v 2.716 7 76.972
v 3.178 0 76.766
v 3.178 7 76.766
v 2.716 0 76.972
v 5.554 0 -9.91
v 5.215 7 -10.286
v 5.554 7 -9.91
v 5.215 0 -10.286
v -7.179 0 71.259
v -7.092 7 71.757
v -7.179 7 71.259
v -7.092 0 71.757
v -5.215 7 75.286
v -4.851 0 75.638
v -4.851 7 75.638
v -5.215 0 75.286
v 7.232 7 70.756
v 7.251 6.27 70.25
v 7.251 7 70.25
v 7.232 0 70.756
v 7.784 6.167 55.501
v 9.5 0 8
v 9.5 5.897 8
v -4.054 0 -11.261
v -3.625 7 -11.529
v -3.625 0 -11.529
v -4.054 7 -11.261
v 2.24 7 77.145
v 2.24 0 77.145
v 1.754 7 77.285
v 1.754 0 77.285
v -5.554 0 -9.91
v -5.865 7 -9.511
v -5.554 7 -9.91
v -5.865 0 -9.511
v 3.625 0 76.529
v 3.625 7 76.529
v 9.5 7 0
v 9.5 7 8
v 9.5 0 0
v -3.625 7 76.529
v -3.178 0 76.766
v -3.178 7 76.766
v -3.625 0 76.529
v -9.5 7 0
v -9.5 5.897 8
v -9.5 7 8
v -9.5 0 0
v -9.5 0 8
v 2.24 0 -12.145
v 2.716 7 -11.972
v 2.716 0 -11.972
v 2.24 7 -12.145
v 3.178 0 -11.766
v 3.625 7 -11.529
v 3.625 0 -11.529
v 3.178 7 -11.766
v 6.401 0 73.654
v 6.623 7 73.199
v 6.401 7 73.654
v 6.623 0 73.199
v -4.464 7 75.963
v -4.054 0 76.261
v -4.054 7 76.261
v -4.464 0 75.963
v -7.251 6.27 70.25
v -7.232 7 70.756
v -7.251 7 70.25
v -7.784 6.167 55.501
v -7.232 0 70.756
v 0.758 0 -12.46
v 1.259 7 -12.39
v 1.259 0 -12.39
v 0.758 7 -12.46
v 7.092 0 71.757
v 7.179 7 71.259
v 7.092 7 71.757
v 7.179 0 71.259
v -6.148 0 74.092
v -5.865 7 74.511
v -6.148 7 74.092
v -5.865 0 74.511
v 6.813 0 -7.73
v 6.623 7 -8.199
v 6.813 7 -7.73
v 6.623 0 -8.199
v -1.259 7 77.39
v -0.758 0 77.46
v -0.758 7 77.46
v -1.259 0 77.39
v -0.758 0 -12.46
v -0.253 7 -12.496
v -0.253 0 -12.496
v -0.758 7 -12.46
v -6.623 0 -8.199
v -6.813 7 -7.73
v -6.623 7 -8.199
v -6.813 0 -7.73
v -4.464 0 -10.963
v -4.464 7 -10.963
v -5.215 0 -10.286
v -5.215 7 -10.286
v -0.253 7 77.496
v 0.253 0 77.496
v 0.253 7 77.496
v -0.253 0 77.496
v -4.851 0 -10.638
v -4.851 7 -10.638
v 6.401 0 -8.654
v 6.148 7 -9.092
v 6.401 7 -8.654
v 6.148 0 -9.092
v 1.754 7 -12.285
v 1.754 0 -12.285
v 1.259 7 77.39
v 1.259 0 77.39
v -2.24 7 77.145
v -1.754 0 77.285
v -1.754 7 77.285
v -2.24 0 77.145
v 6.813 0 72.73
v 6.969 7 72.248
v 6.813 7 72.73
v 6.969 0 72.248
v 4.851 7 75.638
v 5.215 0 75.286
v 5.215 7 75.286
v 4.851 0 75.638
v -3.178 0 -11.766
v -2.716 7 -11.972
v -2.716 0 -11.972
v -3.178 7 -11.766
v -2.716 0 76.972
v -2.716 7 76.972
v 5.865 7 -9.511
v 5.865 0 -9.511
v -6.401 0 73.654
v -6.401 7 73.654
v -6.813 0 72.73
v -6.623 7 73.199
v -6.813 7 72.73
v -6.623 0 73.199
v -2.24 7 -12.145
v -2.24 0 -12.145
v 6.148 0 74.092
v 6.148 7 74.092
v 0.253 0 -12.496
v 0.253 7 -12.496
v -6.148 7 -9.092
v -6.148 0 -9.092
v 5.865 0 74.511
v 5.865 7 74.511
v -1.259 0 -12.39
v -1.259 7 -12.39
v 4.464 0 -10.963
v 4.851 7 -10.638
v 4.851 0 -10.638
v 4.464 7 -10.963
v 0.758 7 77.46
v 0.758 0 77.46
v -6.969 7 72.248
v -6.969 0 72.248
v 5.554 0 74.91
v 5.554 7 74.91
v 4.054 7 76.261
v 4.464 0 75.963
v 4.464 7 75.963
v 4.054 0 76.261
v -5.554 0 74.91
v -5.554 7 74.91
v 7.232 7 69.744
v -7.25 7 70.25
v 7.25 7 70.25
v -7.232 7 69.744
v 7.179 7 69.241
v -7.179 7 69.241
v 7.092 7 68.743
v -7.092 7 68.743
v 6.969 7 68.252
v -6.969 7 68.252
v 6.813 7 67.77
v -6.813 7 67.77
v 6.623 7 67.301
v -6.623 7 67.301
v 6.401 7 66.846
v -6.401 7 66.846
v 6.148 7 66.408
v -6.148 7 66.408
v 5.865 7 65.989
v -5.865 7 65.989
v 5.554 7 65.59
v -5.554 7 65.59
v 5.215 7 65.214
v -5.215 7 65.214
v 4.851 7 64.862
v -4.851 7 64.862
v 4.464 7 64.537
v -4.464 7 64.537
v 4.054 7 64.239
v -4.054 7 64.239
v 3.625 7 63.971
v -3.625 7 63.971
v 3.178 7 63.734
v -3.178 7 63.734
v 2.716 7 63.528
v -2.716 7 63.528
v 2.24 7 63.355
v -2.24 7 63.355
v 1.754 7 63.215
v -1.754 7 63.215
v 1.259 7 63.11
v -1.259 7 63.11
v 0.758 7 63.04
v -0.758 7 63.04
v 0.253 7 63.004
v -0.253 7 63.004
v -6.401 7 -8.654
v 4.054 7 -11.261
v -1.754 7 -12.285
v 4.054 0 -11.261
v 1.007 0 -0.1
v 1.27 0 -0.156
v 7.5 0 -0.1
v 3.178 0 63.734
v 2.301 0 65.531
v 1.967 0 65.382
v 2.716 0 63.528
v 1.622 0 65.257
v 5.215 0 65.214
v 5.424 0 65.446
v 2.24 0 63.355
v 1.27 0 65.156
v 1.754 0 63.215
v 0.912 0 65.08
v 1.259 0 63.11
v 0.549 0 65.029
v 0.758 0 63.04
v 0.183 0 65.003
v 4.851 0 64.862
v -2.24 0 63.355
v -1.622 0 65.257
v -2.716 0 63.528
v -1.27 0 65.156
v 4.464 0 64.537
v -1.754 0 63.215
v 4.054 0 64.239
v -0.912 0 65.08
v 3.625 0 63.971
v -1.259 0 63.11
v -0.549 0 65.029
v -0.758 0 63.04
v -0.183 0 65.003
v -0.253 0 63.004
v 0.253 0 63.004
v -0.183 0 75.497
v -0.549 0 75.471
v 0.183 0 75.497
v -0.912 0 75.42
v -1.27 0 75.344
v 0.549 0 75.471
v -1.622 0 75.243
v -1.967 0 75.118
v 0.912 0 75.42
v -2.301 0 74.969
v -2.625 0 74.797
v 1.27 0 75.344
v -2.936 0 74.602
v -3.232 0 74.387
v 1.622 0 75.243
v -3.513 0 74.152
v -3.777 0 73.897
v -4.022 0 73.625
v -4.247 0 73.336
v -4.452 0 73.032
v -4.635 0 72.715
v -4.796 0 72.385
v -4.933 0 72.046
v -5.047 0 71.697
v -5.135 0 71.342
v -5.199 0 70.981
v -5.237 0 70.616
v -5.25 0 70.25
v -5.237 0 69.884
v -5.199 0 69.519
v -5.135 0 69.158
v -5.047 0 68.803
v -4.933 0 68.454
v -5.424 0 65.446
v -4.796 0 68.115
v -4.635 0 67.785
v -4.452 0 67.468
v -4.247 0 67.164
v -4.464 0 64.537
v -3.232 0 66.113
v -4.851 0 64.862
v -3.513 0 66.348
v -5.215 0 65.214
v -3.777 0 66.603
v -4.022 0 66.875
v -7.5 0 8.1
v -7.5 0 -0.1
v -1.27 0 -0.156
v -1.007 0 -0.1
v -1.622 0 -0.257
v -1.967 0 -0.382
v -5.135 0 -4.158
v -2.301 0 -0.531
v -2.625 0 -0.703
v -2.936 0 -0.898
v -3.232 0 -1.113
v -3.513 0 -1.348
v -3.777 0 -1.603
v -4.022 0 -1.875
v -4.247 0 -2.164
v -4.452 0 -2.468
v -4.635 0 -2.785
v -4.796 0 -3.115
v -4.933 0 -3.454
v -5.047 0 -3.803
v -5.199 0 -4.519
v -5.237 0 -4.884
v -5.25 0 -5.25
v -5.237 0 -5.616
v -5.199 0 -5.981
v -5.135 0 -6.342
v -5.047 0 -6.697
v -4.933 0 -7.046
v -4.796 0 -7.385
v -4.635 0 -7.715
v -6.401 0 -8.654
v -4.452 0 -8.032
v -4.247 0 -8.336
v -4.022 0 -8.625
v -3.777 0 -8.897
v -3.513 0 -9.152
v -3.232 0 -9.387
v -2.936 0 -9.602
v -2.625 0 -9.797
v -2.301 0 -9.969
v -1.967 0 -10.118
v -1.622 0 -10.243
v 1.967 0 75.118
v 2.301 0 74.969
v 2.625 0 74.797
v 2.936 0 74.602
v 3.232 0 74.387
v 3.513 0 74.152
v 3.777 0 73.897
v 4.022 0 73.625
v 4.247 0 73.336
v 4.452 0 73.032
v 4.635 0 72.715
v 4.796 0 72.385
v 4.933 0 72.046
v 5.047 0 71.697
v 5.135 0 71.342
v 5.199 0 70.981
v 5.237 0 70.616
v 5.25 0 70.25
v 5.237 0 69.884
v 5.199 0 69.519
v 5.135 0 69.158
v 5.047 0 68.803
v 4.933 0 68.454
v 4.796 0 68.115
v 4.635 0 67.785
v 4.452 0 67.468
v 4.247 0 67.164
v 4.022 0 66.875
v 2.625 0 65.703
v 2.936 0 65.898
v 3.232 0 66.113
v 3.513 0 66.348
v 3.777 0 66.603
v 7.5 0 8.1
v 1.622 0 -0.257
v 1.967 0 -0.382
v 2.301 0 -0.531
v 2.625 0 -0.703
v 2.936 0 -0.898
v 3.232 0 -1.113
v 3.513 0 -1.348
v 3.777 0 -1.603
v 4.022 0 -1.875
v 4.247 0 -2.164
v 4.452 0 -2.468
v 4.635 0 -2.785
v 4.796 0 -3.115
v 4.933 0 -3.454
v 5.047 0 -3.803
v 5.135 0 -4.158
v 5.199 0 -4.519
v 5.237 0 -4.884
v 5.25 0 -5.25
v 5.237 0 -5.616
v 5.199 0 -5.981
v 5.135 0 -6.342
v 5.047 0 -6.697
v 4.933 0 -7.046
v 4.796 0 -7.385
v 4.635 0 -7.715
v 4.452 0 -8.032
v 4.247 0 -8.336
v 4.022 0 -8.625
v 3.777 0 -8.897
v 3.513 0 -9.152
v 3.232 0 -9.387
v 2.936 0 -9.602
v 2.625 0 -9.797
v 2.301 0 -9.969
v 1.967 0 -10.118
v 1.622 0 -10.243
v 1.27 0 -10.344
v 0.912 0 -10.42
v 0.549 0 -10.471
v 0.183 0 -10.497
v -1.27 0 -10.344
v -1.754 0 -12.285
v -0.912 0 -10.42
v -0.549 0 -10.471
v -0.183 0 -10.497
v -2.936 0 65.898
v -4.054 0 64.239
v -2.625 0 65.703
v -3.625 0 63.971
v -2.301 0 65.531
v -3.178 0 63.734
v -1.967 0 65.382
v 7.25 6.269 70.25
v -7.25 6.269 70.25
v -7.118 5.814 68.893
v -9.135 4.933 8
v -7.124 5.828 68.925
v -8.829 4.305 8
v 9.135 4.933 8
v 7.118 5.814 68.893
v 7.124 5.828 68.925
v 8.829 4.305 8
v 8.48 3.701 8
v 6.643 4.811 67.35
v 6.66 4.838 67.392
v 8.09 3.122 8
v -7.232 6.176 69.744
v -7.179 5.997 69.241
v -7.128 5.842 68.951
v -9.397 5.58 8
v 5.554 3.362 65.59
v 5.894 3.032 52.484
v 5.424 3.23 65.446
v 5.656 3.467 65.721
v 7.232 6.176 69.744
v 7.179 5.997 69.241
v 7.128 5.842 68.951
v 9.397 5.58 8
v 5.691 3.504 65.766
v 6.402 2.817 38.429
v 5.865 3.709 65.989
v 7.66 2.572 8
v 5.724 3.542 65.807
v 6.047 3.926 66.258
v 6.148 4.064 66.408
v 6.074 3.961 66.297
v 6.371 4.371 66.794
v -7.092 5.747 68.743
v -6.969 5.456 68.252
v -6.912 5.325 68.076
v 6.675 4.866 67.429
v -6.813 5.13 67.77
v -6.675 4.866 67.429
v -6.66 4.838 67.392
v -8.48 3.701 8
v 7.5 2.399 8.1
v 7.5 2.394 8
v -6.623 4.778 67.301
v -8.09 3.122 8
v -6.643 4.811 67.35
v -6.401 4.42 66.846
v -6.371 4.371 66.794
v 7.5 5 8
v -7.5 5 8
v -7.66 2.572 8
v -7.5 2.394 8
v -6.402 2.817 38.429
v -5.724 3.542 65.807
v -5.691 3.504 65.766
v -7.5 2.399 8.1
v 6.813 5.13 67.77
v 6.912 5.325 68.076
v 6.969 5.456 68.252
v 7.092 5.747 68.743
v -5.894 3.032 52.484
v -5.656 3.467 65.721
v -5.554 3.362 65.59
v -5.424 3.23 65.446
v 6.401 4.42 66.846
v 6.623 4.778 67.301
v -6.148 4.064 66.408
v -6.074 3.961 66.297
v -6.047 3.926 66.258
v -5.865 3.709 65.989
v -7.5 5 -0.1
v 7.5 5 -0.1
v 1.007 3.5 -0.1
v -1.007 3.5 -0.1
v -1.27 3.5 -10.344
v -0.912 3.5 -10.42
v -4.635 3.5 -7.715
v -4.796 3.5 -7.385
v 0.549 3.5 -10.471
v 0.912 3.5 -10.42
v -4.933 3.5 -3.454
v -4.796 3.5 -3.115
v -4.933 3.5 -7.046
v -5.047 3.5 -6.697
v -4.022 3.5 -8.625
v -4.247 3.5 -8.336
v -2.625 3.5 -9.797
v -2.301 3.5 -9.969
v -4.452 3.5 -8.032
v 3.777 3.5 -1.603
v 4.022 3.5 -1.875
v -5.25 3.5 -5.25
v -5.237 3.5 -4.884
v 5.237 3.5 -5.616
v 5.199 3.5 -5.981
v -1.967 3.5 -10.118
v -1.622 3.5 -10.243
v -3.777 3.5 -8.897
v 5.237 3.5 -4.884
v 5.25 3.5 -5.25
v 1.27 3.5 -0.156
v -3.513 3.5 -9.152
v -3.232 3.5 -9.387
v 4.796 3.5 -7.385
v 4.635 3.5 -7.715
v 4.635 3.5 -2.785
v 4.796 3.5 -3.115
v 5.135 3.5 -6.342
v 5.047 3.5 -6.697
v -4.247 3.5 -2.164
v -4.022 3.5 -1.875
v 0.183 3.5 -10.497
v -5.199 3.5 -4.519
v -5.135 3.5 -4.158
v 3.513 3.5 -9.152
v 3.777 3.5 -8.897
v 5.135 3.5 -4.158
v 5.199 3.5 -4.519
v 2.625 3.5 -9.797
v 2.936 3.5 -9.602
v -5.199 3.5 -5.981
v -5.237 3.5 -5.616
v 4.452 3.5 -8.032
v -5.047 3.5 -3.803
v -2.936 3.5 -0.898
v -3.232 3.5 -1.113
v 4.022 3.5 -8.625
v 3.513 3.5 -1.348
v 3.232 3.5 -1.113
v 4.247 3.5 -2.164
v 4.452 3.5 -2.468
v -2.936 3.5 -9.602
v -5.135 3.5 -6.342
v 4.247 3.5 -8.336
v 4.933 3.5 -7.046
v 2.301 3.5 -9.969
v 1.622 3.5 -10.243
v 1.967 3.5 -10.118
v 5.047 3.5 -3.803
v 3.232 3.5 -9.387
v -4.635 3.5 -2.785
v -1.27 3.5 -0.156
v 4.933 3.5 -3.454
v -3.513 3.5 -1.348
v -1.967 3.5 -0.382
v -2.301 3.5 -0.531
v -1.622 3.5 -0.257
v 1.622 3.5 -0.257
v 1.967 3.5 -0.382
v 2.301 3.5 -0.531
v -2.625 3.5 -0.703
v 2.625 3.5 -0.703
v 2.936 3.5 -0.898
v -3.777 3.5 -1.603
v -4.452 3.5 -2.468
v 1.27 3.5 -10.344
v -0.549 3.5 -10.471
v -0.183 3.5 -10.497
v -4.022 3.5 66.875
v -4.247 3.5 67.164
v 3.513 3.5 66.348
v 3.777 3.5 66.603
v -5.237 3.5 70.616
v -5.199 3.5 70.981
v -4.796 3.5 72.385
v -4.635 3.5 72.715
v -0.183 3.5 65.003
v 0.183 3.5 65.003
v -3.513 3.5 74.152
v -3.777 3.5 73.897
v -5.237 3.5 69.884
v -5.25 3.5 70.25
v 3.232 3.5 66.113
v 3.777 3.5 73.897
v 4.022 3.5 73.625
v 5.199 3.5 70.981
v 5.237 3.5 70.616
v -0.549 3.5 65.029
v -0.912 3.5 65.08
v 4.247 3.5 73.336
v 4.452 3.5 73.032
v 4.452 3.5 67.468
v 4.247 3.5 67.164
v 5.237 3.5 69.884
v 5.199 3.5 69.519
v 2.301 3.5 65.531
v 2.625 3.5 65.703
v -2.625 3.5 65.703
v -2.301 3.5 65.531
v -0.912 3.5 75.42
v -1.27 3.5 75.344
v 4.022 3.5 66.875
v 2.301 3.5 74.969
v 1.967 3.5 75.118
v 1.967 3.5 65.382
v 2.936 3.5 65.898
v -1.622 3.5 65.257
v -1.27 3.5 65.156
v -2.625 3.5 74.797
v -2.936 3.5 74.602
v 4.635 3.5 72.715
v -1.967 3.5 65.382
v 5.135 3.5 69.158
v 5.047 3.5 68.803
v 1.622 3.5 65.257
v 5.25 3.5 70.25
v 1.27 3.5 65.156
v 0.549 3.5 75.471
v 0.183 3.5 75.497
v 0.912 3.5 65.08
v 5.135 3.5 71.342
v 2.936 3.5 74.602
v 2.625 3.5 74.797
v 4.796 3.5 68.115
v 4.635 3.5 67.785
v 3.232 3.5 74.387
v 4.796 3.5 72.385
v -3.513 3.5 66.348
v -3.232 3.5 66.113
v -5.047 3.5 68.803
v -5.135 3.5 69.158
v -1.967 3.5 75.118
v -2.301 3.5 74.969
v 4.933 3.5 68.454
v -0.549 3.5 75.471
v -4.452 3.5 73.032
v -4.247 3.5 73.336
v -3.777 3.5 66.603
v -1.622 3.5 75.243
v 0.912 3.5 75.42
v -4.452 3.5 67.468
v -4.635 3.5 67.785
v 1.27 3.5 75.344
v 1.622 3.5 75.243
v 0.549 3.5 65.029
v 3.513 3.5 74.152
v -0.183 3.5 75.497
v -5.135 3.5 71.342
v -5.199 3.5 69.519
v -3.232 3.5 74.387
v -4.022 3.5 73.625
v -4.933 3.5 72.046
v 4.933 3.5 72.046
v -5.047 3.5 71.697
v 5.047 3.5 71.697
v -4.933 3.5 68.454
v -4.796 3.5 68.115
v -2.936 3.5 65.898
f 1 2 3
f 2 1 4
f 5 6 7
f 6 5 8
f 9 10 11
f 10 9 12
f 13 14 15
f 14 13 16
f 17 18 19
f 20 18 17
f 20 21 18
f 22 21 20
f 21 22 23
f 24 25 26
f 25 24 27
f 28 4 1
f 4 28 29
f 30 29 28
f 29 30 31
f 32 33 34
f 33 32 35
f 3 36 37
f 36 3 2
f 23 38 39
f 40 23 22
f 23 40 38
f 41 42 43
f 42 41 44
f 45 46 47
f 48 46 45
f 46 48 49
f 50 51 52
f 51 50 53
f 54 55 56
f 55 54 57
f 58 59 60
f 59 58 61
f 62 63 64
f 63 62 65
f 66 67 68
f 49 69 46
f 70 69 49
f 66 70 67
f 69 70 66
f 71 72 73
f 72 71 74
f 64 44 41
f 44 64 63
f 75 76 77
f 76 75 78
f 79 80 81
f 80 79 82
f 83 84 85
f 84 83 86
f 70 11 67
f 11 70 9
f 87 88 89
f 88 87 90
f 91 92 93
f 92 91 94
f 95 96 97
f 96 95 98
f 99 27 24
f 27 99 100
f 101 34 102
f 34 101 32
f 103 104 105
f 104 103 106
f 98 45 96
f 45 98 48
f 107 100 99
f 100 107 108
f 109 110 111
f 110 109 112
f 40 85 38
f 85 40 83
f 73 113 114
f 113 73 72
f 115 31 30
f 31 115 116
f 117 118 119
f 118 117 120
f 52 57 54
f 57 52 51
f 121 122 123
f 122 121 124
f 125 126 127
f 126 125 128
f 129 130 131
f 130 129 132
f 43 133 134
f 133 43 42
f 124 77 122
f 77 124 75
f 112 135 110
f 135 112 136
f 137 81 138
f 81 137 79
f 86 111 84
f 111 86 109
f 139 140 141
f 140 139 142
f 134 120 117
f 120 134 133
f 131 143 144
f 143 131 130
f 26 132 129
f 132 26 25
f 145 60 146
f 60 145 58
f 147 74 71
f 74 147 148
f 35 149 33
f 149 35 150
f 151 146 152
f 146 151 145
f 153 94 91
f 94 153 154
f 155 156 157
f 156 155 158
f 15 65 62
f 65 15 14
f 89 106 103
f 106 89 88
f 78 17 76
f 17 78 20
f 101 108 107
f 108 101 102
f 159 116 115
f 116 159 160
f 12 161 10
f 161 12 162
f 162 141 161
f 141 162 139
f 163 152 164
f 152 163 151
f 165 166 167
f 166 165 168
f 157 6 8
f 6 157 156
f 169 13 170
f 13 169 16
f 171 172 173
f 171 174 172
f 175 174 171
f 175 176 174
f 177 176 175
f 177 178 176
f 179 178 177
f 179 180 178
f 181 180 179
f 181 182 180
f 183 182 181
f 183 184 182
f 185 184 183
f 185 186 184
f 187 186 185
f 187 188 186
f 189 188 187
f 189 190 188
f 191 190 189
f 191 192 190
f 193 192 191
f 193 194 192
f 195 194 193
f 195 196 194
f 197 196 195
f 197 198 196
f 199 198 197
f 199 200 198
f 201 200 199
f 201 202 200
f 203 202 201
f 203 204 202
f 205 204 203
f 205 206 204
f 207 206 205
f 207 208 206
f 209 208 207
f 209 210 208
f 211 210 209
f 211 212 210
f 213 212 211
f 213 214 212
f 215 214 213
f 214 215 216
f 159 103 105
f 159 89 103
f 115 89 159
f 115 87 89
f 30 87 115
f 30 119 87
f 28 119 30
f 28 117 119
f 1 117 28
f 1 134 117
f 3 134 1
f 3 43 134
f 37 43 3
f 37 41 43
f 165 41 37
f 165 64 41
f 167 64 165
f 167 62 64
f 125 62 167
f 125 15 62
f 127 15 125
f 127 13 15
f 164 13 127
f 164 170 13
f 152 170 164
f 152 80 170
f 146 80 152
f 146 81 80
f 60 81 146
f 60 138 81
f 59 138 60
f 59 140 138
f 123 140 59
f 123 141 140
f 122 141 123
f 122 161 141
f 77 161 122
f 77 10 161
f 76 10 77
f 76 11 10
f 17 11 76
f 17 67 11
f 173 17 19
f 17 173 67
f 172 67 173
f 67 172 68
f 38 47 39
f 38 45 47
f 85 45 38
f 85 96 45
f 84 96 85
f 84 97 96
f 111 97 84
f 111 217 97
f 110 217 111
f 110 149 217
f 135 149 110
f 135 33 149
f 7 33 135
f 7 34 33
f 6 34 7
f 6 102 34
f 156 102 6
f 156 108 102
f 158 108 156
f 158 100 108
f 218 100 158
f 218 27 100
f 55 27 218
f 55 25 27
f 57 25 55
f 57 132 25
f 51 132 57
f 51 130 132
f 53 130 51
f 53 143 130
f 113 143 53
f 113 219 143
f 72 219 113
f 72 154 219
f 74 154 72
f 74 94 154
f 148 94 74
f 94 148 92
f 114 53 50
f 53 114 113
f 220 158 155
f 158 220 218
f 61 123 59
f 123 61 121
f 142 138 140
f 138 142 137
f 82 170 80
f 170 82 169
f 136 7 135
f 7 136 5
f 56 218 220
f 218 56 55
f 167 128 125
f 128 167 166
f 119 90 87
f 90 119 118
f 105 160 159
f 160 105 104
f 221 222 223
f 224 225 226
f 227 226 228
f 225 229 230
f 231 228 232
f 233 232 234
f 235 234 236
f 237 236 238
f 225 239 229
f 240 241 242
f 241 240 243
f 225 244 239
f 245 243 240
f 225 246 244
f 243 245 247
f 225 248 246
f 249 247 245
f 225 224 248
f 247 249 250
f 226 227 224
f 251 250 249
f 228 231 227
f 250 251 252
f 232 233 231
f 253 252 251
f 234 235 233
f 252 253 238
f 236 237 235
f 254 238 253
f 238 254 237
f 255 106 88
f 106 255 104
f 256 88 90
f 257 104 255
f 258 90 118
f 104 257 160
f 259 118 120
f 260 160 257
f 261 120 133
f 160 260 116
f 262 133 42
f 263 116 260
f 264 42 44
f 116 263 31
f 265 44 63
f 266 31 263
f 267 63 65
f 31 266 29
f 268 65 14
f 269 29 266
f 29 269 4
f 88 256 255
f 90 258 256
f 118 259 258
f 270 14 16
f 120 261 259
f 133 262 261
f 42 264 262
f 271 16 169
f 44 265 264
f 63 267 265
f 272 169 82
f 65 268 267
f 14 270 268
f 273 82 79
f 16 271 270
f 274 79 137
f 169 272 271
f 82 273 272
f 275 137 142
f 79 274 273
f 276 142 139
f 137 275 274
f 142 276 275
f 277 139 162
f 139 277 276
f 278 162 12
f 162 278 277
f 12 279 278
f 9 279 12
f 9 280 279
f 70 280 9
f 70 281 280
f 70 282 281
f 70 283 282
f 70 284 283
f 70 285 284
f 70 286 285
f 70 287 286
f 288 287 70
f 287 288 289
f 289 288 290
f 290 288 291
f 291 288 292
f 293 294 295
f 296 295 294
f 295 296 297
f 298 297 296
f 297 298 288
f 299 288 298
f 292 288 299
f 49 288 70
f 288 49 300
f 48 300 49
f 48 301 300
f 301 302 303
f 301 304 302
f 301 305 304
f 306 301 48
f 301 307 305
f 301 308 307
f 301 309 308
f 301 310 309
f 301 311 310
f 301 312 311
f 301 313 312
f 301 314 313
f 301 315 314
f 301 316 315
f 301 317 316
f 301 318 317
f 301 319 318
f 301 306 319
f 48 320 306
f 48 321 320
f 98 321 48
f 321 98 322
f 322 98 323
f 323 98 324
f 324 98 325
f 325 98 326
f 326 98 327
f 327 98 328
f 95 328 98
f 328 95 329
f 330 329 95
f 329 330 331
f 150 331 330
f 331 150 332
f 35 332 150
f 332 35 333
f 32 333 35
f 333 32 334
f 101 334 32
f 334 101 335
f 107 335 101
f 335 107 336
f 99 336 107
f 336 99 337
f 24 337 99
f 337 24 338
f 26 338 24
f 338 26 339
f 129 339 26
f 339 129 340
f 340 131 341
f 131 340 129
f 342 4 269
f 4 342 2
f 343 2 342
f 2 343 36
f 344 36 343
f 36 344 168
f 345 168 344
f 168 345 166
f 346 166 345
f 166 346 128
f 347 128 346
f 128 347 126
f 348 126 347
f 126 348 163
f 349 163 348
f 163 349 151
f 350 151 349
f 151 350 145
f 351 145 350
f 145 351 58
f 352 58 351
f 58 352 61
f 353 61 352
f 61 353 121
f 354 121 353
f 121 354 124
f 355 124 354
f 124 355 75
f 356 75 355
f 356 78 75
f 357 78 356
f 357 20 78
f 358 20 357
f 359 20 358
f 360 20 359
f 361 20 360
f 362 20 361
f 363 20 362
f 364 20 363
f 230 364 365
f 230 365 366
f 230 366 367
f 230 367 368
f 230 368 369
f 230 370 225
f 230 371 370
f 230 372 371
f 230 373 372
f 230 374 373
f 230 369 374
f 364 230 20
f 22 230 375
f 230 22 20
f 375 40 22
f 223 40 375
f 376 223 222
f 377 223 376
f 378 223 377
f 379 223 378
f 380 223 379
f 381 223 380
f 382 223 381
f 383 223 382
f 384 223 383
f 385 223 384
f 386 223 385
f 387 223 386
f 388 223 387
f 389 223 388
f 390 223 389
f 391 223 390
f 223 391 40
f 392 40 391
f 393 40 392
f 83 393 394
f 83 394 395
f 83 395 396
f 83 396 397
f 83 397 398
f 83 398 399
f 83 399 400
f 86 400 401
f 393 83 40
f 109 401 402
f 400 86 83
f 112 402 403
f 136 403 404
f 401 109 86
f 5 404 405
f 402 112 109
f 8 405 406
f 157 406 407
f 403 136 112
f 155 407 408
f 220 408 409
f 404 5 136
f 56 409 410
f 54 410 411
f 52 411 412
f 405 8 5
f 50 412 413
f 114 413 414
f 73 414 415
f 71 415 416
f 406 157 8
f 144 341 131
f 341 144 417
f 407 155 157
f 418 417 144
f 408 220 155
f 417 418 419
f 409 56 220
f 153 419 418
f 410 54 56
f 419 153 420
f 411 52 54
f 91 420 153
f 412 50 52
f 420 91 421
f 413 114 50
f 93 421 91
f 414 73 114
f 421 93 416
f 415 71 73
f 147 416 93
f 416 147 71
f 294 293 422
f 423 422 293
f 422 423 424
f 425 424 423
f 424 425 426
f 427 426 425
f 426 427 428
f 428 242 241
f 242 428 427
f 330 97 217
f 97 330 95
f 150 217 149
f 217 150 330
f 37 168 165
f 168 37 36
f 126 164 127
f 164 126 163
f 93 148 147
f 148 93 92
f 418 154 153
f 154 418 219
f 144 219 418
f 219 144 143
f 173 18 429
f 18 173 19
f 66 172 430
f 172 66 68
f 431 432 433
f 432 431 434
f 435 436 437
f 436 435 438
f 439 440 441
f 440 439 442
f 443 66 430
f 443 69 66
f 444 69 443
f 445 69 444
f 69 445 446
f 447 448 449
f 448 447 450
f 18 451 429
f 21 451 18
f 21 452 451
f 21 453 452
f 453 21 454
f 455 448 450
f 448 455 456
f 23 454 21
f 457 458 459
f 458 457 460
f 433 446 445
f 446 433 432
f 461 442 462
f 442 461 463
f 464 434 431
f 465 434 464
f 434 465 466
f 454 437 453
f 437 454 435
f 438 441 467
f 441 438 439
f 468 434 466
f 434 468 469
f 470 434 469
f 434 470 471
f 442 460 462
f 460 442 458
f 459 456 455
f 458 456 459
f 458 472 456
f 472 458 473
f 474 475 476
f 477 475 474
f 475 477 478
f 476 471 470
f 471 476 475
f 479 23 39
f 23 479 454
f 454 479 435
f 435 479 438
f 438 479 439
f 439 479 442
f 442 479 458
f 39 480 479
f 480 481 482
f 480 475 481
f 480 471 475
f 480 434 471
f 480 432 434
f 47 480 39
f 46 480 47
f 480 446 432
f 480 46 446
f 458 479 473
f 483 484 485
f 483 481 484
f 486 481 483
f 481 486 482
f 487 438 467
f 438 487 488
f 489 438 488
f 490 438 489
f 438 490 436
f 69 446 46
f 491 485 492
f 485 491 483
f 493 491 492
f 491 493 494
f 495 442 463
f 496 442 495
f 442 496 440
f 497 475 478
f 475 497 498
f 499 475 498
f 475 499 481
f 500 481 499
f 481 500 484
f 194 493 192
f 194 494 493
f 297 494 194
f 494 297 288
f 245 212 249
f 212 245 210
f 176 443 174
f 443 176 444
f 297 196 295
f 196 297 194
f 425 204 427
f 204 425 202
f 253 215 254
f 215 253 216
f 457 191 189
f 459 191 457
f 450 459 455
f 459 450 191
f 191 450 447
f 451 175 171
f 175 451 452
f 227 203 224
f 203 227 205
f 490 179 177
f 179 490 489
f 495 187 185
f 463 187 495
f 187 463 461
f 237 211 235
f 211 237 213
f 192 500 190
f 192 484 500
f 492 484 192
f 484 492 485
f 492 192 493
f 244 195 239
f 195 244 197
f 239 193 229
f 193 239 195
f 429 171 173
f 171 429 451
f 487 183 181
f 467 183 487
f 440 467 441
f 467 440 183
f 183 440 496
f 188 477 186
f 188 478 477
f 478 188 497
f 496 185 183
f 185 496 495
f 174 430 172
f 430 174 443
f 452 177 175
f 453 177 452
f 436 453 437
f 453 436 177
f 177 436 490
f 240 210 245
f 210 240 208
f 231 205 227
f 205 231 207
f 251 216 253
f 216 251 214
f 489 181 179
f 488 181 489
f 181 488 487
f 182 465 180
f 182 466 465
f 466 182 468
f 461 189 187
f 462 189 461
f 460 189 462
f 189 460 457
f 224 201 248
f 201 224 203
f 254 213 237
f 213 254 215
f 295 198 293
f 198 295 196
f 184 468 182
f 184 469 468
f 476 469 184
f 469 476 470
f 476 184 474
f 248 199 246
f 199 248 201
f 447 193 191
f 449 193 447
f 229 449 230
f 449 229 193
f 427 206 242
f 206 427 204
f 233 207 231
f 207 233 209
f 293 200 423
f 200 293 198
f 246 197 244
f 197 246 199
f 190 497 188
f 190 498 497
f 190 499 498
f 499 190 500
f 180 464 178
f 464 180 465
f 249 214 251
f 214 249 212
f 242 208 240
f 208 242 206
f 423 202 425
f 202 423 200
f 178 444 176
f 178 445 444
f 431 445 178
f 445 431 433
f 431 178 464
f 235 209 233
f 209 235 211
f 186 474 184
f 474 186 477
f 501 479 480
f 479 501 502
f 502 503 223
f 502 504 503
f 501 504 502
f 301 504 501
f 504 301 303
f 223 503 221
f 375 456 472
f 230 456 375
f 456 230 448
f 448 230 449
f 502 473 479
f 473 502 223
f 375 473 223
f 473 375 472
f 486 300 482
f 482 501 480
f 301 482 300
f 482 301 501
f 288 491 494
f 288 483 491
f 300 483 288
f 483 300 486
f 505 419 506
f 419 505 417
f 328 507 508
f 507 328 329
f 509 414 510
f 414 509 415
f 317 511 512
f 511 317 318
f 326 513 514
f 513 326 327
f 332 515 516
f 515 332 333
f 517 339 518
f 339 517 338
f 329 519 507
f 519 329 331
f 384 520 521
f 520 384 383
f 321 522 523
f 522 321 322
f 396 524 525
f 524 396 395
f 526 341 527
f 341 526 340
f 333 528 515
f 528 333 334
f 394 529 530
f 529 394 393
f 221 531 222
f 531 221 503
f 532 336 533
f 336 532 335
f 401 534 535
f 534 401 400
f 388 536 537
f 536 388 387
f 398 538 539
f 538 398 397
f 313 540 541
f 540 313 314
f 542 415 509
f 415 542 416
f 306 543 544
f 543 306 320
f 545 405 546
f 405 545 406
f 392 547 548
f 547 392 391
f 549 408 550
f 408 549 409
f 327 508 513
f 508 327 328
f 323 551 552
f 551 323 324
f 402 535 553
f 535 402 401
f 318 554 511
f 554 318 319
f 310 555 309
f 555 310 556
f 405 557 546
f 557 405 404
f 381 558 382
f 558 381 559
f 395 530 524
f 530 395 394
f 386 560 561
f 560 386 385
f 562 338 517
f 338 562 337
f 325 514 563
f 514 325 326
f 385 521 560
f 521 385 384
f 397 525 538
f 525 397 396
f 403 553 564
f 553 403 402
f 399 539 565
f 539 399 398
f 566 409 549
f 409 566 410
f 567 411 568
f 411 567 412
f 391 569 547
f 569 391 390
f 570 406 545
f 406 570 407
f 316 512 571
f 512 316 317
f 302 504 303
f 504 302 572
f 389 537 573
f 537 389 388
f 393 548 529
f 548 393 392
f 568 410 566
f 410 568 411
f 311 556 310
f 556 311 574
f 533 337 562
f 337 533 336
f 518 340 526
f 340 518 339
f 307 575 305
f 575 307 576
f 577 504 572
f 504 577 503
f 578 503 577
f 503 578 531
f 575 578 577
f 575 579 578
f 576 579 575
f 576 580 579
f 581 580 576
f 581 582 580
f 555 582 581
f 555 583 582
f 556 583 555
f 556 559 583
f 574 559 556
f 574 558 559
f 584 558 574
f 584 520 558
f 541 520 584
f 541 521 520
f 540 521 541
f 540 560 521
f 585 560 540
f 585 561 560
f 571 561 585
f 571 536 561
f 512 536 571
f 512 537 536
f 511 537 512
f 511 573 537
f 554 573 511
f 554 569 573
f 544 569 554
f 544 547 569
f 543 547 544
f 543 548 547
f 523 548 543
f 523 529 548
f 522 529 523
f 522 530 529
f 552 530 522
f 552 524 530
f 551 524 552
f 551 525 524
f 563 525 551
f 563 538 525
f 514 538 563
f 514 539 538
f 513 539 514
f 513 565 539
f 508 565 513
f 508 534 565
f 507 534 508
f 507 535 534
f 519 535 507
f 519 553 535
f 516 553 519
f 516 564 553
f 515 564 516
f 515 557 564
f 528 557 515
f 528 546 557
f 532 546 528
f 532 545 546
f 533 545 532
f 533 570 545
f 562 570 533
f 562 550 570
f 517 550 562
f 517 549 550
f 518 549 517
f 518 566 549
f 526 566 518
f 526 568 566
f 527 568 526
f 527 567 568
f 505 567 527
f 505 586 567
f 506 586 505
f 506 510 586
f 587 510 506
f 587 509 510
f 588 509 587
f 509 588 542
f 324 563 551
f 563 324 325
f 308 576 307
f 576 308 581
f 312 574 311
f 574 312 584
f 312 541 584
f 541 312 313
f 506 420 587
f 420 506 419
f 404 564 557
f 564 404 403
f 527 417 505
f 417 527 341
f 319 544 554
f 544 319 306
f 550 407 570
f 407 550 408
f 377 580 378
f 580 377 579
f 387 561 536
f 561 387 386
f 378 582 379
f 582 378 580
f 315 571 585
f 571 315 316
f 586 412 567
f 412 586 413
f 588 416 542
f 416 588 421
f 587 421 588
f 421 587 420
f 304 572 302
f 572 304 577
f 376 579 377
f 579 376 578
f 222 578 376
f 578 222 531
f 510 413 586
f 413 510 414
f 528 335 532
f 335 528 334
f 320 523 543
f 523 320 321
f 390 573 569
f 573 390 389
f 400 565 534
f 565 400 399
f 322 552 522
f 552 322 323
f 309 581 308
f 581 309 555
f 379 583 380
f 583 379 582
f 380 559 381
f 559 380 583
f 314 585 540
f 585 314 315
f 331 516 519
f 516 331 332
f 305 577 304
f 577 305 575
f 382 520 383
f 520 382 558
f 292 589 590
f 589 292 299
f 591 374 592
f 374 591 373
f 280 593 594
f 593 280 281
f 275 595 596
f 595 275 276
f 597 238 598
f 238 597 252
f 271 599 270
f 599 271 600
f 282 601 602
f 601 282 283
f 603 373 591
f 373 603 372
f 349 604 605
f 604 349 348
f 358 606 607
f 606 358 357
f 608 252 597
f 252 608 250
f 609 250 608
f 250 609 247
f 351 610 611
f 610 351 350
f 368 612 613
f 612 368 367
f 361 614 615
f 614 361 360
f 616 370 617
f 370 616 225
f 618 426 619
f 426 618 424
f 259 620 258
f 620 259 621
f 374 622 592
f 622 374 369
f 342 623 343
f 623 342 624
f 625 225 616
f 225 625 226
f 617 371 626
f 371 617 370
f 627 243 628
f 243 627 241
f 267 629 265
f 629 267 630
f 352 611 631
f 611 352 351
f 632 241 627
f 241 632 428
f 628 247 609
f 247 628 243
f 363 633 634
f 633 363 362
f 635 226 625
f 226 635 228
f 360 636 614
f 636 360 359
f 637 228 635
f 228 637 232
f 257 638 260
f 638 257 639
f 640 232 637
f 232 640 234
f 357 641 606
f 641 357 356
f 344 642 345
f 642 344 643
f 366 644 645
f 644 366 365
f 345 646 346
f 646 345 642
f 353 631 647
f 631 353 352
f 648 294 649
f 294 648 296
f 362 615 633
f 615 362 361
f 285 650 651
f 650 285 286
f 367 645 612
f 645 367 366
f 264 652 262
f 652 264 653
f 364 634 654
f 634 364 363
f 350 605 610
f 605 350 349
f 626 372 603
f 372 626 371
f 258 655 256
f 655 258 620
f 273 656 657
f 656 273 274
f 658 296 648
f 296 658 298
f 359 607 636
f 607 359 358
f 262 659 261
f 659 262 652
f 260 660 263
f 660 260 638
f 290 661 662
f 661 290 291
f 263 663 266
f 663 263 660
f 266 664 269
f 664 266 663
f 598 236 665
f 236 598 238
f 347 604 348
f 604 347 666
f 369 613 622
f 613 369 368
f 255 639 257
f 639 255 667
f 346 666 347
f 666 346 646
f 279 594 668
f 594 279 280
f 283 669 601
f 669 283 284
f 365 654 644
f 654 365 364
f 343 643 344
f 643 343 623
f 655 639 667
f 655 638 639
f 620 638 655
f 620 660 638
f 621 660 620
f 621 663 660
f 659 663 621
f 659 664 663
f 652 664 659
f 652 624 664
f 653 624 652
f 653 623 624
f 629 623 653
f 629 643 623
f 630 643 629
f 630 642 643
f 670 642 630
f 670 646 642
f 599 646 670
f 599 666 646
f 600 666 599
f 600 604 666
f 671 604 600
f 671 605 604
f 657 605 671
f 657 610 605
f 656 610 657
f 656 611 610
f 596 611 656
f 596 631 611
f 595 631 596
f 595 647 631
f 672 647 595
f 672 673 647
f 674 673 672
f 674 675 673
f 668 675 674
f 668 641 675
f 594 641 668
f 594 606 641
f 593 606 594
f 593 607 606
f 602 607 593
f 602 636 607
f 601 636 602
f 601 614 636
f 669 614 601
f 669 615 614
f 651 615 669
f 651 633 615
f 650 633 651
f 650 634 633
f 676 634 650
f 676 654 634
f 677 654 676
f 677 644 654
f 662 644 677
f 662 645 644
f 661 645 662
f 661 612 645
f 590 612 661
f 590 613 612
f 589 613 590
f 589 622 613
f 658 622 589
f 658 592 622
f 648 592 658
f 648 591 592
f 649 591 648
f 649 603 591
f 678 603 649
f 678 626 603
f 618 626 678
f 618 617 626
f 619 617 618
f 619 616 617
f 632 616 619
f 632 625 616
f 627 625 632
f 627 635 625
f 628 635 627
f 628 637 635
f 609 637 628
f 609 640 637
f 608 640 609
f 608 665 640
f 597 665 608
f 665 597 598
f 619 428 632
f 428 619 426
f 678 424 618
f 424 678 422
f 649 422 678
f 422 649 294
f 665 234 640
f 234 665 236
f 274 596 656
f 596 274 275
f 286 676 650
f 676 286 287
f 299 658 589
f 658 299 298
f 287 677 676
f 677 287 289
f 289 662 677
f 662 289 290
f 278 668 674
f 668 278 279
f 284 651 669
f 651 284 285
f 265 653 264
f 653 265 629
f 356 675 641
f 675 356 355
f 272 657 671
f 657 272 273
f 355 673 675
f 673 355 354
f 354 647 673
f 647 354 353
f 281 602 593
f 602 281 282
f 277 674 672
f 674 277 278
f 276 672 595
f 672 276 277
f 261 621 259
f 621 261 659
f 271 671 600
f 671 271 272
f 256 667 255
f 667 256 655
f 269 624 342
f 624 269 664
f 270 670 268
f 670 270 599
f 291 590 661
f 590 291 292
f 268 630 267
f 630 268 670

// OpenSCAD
tooth_x=15;
tooth_y=5;
tooth_z=8;

mouth_z=13;

shell_pad=1;

top=55;
magnet=10.5;
magnet_h=3.5;

wall=2;
walll=wall*2;

pad=0.1;
padd=pad*2;

shell1=20-tooth_x+magnet;
shell2=20;
$fn=90;

difference() {
    union() {
        difference() {
                hull() {
                    translate([-tooth_x/2-wall,0,0])
                    cube([tooth_x+walll,tooth_y+wall,tooth_z]);
                    translate([0,0,-magnet/2])
                    rotate([-90,0,0])
                    //cylinder(d=magnet+walll,h=magnet_h+wall);
                    cylinder(d=magnet+walll,h=tooth_y+wall);
                    translate([0,0,top+tooth_z+magnet/2+wall])
                    rotate([-90,0,0])
                    //cylinder(d=magnet+walll,h=magnet_h+wall);
                    cylinder(d=magnet+walll,h=tooth_y+wall);
                }
            translate([0,shell2/2-shell_pad,tooth_z])
            cylinder(d2=shell1,d1=shell2,h=top+magnet/2+wall);
        }
        translate([0,0,top+tooth_z+magnet/2+wall])
        rotate([-90,0,0])
        //cylinder(d=magnet+walll,h=magnet_h+wall);
        cylinder(d=magnet+walll,h=tooth_y+wall);
    }
    difference() {
        hull() {
            translate([-tooth_x/2,-pad,-pad])
            cube([tooth_x,tooth_y+pad,tooth_z+padd]);
            translate([0,-pad,top+tooth_z+magnet/2+wall])
            rotate([-90,0,0])
            cylinder(d=magnet,h=magnet_h+pad);
        }
        translate([0,0,top+tooth_z+magnet/2+wall])
        rotate([-90,0,0])
        //cylinder(d=magnet+walll,h=magnet_h+wall);
        cylinder(d=magnet+walll,h=tooth_y+wall);
    }
    translate([0,-pad,-magnet/2])
    rotate([-90,0,0])
    cylinder(d=magnet,h=magnet_h+pad);
    translate([0,-pad,top+tooth_z+magnet/2+wall])
    rotate([-90,0,0])
    cylinder(d=magnet,h=magnet_h+pad);
}
